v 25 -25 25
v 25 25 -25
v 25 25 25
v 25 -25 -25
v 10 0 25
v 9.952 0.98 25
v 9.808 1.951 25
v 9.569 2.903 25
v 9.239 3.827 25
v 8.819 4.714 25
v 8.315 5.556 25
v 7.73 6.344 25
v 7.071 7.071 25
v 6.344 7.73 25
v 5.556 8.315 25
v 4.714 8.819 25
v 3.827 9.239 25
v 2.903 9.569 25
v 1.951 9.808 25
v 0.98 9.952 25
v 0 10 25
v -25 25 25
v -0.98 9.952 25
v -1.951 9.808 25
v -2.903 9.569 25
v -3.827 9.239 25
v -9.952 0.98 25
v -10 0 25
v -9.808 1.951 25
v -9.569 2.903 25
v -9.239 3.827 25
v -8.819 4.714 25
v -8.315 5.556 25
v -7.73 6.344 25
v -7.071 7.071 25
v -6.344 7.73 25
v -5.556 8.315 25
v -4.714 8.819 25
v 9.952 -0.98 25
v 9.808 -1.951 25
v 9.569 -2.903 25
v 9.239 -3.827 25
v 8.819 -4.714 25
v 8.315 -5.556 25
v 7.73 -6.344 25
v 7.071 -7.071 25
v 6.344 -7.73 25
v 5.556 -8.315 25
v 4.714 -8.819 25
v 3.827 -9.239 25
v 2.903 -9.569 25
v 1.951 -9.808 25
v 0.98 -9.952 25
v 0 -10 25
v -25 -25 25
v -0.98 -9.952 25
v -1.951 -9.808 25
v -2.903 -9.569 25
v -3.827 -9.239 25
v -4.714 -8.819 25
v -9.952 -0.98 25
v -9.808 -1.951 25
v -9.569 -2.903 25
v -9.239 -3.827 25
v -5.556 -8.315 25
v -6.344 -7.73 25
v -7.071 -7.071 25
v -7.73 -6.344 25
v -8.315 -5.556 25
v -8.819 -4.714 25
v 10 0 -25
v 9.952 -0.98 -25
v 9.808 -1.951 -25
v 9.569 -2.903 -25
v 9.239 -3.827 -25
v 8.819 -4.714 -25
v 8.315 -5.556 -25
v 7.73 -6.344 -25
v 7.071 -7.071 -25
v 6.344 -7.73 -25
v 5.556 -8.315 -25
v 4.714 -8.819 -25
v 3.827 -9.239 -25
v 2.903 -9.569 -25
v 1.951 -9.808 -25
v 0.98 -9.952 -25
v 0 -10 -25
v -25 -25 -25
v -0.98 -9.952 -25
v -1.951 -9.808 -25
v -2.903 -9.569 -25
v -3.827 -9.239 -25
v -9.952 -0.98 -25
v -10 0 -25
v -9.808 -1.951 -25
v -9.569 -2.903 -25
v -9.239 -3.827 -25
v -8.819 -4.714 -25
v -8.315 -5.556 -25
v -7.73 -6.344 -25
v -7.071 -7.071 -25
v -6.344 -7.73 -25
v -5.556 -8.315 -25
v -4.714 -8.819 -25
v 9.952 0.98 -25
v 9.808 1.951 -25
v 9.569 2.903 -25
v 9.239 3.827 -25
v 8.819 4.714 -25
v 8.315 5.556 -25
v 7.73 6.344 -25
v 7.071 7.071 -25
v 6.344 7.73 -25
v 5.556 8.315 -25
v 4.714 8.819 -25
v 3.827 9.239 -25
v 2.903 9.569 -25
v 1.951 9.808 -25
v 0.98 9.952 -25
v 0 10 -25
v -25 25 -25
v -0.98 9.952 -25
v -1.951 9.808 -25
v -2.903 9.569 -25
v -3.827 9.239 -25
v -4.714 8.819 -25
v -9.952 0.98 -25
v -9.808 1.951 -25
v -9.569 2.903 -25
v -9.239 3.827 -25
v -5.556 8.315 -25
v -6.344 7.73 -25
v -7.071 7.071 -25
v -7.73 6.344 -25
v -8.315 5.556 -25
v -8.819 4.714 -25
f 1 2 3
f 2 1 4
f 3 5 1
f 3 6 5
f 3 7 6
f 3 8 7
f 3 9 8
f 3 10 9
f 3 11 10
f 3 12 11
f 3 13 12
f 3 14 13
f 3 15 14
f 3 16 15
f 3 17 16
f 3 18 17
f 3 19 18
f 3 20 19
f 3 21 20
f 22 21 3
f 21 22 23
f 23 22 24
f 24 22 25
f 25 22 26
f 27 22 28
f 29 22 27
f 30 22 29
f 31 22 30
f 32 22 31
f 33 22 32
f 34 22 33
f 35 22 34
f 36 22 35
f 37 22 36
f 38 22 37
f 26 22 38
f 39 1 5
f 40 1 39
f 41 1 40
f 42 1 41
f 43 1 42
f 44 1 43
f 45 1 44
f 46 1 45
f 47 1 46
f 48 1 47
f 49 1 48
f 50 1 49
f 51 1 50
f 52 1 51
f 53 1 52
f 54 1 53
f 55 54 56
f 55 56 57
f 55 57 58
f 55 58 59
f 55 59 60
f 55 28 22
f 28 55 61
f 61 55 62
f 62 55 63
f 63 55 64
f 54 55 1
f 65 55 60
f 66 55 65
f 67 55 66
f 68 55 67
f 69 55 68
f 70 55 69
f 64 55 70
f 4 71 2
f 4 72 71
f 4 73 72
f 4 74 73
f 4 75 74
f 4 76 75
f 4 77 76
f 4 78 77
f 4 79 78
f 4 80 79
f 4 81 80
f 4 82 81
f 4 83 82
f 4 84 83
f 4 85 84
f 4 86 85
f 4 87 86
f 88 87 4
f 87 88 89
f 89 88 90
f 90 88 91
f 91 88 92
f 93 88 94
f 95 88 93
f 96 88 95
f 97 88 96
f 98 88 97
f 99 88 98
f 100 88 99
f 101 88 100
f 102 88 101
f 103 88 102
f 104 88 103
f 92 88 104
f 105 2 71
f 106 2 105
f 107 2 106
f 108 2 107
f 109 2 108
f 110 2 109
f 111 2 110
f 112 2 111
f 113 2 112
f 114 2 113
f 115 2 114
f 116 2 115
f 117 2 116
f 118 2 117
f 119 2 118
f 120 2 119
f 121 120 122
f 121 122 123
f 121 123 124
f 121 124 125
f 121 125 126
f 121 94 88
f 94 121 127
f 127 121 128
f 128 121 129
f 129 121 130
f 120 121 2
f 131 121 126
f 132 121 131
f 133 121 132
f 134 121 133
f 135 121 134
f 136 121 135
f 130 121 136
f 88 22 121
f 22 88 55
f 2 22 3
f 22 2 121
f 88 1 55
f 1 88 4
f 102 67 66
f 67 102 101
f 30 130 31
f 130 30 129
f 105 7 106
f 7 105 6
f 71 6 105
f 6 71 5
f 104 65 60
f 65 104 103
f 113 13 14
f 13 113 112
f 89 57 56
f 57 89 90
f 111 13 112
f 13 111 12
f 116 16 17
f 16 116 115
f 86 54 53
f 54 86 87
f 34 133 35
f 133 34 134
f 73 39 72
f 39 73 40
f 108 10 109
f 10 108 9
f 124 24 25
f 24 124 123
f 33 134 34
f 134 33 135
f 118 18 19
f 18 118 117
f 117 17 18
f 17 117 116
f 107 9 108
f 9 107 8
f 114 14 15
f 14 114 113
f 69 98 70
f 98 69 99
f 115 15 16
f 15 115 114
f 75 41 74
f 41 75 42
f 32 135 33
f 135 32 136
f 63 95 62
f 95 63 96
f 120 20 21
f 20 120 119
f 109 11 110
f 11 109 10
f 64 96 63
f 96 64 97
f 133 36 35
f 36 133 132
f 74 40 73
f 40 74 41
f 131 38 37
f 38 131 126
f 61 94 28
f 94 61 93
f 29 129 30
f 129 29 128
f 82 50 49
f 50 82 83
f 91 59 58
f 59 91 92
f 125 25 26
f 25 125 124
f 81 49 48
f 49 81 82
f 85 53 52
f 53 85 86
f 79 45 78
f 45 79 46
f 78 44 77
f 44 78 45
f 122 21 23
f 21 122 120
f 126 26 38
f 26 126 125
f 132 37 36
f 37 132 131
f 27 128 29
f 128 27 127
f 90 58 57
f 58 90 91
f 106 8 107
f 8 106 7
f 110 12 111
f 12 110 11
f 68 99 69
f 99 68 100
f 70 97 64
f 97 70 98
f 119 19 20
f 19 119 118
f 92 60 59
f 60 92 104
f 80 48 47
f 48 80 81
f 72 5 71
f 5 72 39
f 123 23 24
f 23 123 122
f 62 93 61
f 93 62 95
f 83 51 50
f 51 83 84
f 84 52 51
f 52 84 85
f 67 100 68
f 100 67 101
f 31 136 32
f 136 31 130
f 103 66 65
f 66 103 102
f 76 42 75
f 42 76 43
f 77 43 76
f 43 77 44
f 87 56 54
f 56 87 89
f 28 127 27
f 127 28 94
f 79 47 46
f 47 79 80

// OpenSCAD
difference() {
    cube(50, center = true);
    translate([0, 0, -25]) // extend below the cube to ensure full cut
        cylinder(d = 20, h = 100, $fn=64, center = false);
}
